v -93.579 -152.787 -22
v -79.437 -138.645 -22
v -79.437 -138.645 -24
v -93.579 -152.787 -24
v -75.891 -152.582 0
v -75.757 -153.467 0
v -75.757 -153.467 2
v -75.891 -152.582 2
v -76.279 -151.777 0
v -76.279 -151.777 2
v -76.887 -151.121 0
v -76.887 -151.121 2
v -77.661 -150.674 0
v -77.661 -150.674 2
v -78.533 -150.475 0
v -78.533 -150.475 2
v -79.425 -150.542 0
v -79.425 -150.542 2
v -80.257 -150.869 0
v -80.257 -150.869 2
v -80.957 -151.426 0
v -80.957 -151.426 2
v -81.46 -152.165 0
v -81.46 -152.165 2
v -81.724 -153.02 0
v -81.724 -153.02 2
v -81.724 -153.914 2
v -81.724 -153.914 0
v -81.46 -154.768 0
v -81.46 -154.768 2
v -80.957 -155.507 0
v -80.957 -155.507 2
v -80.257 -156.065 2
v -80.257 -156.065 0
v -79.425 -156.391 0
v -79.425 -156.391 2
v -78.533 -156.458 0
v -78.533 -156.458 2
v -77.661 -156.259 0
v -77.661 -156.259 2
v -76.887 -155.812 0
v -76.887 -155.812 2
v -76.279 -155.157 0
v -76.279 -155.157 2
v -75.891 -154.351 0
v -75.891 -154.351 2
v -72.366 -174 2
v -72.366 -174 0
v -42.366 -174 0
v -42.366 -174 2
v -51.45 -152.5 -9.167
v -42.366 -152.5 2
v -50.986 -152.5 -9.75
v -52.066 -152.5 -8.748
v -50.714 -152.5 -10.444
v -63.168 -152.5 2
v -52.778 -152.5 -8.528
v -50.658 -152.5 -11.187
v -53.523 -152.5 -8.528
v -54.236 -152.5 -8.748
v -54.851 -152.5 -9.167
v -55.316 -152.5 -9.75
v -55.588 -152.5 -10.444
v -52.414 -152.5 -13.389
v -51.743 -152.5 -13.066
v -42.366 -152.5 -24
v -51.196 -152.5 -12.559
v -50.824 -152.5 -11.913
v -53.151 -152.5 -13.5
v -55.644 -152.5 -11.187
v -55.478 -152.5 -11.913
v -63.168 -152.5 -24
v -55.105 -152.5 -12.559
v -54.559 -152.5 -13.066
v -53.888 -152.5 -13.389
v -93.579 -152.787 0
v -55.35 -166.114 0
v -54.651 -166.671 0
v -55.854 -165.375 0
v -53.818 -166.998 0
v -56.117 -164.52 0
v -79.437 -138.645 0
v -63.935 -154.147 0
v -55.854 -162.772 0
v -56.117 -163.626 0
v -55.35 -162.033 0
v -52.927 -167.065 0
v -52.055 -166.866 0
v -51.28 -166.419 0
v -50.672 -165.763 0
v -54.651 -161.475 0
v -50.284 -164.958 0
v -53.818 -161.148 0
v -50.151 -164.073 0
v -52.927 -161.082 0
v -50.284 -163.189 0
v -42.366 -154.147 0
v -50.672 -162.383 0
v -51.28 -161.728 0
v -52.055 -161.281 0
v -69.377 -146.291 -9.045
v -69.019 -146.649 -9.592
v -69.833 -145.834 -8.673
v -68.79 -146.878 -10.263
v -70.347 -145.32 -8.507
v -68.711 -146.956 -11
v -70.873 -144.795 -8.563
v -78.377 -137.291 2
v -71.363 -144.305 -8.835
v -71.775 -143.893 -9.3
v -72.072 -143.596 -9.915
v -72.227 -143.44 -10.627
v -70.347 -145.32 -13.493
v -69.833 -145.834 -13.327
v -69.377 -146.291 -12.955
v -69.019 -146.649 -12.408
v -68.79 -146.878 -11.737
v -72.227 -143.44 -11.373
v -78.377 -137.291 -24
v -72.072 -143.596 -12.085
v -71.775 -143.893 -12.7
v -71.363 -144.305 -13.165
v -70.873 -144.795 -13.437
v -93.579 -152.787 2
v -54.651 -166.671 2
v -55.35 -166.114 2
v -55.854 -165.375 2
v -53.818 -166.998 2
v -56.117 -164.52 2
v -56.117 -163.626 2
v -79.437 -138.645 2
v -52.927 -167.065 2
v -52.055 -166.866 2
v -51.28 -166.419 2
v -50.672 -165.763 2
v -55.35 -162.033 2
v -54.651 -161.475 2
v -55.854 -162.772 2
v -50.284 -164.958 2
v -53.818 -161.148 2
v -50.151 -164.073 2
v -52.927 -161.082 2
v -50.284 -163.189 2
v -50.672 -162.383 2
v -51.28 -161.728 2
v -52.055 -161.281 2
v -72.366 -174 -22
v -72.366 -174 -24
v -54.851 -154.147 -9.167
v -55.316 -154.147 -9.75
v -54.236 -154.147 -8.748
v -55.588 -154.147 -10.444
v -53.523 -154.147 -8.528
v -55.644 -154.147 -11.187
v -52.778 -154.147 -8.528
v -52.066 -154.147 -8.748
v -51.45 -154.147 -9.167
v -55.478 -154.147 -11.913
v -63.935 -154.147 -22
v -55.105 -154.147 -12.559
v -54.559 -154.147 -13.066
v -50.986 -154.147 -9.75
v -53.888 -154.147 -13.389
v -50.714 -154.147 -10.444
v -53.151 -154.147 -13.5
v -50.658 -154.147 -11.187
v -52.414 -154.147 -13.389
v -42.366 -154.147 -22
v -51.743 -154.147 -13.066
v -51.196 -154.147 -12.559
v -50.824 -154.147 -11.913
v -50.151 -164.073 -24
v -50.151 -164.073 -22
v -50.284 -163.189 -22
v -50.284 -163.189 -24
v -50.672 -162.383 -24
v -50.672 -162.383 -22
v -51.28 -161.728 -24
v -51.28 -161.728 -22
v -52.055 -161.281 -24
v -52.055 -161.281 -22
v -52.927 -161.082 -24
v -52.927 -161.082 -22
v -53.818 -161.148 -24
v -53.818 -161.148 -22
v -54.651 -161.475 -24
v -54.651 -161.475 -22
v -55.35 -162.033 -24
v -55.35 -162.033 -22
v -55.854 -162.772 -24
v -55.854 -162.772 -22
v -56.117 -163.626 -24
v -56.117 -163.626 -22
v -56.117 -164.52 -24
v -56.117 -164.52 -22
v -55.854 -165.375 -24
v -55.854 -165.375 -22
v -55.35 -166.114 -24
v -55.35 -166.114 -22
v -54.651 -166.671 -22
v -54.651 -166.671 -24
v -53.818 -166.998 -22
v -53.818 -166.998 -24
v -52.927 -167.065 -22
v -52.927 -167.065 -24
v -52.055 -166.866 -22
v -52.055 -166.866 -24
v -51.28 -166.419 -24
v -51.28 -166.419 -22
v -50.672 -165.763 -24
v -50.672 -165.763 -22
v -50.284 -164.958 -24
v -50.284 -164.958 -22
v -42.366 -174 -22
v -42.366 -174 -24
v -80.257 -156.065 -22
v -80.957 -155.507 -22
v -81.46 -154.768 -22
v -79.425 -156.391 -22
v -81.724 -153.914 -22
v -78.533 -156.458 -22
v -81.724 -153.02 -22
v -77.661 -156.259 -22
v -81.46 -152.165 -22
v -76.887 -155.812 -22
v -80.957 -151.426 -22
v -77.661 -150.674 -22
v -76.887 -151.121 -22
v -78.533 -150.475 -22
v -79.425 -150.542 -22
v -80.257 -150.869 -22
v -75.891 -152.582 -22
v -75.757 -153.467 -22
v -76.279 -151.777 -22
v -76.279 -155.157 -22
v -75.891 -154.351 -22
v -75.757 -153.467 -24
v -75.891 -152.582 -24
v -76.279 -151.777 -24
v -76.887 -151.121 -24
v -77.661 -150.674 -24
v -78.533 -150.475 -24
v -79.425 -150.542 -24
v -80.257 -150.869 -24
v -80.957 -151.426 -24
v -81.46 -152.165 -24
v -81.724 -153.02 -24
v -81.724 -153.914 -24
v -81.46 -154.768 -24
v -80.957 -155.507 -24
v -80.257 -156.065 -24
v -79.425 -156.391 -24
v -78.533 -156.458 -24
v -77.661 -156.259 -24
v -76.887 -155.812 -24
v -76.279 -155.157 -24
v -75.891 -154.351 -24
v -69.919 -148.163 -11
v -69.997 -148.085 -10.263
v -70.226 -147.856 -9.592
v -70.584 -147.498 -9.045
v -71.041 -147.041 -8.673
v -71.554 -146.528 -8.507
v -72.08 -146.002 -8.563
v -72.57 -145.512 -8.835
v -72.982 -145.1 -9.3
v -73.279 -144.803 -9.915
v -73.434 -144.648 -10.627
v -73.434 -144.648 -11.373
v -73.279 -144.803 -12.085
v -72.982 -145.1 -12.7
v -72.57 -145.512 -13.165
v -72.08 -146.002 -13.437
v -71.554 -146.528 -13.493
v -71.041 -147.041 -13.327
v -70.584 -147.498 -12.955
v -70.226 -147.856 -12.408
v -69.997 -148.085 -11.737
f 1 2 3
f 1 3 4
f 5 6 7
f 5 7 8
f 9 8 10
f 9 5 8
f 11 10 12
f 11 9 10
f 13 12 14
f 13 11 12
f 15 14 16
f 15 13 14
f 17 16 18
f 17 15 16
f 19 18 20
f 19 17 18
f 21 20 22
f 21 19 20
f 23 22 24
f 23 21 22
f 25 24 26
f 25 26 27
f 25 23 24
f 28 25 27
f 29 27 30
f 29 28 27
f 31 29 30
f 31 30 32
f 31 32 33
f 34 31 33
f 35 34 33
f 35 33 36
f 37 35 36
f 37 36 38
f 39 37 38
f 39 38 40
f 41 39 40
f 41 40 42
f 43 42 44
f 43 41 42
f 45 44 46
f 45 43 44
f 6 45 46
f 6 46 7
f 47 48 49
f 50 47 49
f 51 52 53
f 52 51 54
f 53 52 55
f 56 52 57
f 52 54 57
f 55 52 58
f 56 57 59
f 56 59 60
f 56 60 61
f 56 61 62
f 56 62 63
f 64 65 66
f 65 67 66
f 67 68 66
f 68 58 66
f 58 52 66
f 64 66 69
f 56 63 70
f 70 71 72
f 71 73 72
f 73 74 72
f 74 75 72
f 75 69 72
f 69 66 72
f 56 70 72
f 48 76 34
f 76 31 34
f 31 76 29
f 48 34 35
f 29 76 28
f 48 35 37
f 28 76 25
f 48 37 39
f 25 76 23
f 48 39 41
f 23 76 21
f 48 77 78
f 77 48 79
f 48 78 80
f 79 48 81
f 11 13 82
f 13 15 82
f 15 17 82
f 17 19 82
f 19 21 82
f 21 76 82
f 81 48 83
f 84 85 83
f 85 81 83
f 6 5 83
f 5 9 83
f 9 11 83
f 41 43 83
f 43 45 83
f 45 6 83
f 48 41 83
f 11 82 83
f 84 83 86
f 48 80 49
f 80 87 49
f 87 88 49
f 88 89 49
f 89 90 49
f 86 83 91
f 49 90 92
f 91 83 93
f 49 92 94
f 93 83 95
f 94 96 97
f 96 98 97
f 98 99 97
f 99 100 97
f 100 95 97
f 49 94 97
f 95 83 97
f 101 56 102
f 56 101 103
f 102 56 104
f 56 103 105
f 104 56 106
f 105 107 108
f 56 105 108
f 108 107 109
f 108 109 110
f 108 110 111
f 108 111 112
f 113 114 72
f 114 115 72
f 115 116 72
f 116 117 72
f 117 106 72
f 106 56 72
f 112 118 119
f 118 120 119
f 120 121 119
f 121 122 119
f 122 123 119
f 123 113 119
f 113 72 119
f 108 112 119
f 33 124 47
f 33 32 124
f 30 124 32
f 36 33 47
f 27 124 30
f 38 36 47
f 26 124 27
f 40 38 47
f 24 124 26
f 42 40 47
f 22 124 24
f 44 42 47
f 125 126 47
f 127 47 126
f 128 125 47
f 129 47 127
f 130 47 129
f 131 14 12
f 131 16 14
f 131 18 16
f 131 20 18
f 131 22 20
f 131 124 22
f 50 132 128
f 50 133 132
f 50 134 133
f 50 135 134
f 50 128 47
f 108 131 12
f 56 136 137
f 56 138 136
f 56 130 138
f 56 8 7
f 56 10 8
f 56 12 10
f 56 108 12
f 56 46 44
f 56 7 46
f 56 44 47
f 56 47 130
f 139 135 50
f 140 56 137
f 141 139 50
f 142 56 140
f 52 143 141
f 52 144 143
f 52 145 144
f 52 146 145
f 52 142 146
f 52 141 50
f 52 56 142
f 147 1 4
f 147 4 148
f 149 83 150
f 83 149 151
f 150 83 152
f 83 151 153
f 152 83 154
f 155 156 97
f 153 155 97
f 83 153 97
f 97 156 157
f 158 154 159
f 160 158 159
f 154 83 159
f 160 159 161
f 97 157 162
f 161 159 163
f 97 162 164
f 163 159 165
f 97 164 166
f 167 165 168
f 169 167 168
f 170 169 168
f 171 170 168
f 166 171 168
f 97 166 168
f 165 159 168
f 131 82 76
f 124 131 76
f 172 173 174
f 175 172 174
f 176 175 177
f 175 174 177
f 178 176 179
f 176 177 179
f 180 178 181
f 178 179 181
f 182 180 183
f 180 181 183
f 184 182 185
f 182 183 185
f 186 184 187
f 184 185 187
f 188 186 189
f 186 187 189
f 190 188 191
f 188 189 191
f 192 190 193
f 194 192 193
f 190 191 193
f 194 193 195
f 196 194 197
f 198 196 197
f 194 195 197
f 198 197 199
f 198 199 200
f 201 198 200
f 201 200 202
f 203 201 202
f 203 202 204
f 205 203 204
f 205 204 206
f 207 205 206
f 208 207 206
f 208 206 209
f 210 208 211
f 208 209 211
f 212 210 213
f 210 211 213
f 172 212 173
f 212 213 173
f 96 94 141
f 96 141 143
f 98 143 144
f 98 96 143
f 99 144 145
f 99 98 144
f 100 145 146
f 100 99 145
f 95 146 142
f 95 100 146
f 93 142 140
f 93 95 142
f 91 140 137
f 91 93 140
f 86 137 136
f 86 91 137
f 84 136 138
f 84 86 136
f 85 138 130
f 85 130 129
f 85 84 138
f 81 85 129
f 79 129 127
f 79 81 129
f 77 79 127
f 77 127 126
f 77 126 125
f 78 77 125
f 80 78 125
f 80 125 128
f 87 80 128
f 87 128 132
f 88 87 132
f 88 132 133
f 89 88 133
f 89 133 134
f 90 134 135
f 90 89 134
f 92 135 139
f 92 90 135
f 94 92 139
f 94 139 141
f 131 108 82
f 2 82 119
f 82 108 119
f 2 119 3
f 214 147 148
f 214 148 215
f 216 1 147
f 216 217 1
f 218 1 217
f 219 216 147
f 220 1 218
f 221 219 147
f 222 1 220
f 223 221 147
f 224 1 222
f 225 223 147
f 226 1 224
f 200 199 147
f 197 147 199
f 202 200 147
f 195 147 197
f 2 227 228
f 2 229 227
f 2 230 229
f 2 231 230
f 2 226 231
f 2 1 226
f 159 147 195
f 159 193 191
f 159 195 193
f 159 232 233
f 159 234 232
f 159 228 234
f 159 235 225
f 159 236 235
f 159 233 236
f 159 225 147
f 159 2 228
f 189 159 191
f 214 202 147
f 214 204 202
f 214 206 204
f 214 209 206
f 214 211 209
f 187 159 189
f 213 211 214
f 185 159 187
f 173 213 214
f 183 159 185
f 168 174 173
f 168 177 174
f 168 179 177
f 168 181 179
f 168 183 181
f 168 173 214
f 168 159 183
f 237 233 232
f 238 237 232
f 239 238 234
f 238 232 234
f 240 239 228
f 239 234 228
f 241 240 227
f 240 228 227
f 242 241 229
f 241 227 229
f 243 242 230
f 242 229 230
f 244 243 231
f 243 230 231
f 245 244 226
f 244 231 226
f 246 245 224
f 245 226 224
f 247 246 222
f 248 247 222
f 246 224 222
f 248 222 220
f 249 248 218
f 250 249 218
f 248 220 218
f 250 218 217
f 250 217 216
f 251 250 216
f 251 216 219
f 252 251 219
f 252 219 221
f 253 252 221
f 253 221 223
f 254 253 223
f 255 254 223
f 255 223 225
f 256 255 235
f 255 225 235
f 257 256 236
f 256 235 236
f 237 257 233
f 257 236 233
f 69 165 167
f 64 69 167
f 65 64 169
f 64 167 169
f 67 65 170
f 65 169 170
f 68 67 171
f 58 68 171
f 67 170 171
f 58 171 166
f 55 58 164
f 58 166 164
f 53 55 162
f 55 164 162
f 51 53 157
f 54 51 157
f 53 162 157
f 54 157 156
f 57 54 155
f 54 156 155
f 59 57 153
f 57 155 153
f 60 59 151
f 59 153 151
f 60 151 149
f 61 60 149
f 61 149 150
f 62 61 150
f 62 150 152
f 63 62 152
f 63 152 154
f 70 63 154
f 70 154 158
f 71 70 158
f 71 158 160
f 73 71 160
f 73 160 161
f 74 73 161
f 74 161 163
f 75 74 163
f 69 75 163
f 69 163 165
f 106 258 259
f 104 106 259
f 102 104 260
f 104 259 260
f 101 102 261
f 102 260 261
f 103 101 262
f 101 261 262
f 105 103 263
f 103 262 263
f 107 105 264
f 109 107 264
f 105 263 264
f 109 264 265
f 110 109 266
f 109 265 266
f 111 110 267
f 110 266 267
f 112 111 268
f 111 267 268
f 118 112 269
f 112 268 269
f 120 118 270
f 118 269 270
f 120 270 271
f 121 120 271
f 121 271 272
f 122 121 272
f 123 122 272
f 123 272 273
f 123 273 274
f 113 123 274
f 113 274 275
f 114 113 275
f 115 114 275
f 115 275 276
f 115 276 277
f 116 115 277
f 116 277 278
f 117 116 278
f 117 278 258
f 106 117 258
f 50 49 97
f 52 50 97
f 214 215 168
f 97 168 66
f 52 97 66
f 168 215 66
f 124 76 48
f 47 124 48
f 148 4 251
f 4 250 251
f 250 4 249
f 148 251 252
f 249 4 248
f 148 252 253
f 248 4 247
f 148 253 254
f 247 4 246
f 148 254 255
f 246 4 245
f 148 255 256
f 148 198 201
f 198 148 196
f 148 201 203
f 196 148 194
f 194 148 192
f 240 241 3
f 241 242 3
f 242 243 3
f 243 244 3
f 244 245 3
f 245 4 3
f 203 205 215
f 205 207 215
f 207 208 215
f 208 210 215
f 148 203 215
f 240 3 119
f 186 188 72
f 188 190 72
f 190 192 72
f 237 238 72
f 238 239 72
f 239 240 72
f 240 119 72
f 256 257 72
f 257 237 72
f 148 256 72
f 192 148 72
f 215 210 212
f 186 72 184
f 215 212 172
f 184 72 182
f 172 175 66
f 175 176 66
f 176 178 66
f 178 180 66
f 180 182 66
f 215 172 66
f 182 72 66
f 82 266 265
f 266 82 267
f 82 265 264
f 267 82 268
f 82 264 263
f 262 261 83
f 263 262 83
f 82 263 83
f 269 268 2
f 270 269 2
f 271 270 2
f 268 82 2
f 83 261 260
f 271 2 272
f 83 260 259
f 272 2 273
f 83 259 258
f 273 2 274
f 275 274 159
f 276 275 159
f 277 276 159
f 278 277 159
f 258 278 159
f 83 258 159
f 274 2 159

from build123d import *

# Parameters (mm, degrees)
ESBO_O1_R                = 3
RESSALTO_EXTRUS_O1_DEPTH = 2
RESSALTO_EXTRUS_O2_DEPTH = 13
CORTE_EXTRUS_O1_REACH    = 100.627
ESBO_O7_R                = 2.5
CORTE_EXTRUS_O2_REACH    = 98.131
ESBO_O6_R                = 2.5


with BuildPart() as part:
    # Esboço1 → Ressalto-extrusão1 (new body)
    with BuildSketch(Plane.XY):
        Polygon((-42.366282029, -174), (-42.366282029, -154.146561088), (-63.935449693, -154.146561088), (-79.437349841, -138.644660941), (-93.579485465, -152.786796564), (-85.828535391, -160.537746638), (-78.077585317, -168.288696712), (-72.366282029, -174), align=None)
        with Locations((-53.150865861, -164.073280544)):
            Circle(ESBO_O1_R, mode=Mode.SUBTRACT)
        with Locations((-78.757467579, -153.466678826)):
            Circle(ESBO_O1_R, mode=Mode.SUBTRACT)
    ressalto_extrus_o1 = extrude(amount=RESSALTO_EXTRUS_O1_DEPTH)

    # Esboço5 → Ressalto-extrusão2 (add)
    with BuildSketch(Plane.XY.offset(2)):
        Polygon((-78.376689669, -137.290878593), (-79.437349841, -138.644660941), (-63.935449693, -154.146561088), (-42.366282029, -154.146561088), (-42.366282029, -152.5), (-63.167568262, -152.5), align=None)
    ressalto_extrus_o2 = extrude(amount=-RESSALTO_EXTRUS_O2_DEPTH)

    # Espelhar2: Ressalto-extrusão1, Ressalto-extrusão2 across plane
    add(ressalto_extrus_o1.mirror(Plane.XY.offset(-11)))
    add(ressalto_extrus_o2.mirror(Plane.XY.offset(-11)))

    # Esboço7 → Corte-extrusão1 (cut, up to next)
    with BuildSketch(Plane.XZ.offset(154.146561088), mode=Mode.PRIVATE) as corte_extrus_o1_sk1:
        with Locations(Location((-53.150865861, -11, 0), (0, 0, 270))):
            Circle(ESBO_O7_R)
    corte_extrus_o1_tool1 = extrude(corte_extrus_o1_sk1.sketch, amount=-CORTE_EXTRUS_O1_REACH, mode=Mode.PRIVATE) & part.part
    add(corte_extrus_o1_tool1.solids().sort_by_distance((-53.150866, -154.146561, -11))[0], mode=Mode.SUBTRACT)

    # Esboço6 → Corte-extrusão2 (cut, up to next)
    with BuildSketch(Plane(origin=(-109.041005391, -109.041005391, 0), x_dir=(-0.7071067811865478, 0.7071067811865472, 0), z_dir=(-0.7071067811865472, -0.7071067811865478, 0)), mode=Mode.PRIVATE) as corte_extrus_o2_sk1:
        with Locations(Location((-52.82738989, 11, 0), (0, 0, 180))):
            Circle(ESBO_O6_R)
    corte_extrus_o2_tool1 = extrude(corte_extrus_o2_sk1.sketch, amount=-CORTE_EXTRUS_O2_REACH, mode=Mode.PRIVATE) & part.part
    add(corte_extrus_o2_tool1.solids().sort_by_distance((-71.6864, -146.395611, -11))[0], mode=Mode.SUBTRACT)


solid = part.part
